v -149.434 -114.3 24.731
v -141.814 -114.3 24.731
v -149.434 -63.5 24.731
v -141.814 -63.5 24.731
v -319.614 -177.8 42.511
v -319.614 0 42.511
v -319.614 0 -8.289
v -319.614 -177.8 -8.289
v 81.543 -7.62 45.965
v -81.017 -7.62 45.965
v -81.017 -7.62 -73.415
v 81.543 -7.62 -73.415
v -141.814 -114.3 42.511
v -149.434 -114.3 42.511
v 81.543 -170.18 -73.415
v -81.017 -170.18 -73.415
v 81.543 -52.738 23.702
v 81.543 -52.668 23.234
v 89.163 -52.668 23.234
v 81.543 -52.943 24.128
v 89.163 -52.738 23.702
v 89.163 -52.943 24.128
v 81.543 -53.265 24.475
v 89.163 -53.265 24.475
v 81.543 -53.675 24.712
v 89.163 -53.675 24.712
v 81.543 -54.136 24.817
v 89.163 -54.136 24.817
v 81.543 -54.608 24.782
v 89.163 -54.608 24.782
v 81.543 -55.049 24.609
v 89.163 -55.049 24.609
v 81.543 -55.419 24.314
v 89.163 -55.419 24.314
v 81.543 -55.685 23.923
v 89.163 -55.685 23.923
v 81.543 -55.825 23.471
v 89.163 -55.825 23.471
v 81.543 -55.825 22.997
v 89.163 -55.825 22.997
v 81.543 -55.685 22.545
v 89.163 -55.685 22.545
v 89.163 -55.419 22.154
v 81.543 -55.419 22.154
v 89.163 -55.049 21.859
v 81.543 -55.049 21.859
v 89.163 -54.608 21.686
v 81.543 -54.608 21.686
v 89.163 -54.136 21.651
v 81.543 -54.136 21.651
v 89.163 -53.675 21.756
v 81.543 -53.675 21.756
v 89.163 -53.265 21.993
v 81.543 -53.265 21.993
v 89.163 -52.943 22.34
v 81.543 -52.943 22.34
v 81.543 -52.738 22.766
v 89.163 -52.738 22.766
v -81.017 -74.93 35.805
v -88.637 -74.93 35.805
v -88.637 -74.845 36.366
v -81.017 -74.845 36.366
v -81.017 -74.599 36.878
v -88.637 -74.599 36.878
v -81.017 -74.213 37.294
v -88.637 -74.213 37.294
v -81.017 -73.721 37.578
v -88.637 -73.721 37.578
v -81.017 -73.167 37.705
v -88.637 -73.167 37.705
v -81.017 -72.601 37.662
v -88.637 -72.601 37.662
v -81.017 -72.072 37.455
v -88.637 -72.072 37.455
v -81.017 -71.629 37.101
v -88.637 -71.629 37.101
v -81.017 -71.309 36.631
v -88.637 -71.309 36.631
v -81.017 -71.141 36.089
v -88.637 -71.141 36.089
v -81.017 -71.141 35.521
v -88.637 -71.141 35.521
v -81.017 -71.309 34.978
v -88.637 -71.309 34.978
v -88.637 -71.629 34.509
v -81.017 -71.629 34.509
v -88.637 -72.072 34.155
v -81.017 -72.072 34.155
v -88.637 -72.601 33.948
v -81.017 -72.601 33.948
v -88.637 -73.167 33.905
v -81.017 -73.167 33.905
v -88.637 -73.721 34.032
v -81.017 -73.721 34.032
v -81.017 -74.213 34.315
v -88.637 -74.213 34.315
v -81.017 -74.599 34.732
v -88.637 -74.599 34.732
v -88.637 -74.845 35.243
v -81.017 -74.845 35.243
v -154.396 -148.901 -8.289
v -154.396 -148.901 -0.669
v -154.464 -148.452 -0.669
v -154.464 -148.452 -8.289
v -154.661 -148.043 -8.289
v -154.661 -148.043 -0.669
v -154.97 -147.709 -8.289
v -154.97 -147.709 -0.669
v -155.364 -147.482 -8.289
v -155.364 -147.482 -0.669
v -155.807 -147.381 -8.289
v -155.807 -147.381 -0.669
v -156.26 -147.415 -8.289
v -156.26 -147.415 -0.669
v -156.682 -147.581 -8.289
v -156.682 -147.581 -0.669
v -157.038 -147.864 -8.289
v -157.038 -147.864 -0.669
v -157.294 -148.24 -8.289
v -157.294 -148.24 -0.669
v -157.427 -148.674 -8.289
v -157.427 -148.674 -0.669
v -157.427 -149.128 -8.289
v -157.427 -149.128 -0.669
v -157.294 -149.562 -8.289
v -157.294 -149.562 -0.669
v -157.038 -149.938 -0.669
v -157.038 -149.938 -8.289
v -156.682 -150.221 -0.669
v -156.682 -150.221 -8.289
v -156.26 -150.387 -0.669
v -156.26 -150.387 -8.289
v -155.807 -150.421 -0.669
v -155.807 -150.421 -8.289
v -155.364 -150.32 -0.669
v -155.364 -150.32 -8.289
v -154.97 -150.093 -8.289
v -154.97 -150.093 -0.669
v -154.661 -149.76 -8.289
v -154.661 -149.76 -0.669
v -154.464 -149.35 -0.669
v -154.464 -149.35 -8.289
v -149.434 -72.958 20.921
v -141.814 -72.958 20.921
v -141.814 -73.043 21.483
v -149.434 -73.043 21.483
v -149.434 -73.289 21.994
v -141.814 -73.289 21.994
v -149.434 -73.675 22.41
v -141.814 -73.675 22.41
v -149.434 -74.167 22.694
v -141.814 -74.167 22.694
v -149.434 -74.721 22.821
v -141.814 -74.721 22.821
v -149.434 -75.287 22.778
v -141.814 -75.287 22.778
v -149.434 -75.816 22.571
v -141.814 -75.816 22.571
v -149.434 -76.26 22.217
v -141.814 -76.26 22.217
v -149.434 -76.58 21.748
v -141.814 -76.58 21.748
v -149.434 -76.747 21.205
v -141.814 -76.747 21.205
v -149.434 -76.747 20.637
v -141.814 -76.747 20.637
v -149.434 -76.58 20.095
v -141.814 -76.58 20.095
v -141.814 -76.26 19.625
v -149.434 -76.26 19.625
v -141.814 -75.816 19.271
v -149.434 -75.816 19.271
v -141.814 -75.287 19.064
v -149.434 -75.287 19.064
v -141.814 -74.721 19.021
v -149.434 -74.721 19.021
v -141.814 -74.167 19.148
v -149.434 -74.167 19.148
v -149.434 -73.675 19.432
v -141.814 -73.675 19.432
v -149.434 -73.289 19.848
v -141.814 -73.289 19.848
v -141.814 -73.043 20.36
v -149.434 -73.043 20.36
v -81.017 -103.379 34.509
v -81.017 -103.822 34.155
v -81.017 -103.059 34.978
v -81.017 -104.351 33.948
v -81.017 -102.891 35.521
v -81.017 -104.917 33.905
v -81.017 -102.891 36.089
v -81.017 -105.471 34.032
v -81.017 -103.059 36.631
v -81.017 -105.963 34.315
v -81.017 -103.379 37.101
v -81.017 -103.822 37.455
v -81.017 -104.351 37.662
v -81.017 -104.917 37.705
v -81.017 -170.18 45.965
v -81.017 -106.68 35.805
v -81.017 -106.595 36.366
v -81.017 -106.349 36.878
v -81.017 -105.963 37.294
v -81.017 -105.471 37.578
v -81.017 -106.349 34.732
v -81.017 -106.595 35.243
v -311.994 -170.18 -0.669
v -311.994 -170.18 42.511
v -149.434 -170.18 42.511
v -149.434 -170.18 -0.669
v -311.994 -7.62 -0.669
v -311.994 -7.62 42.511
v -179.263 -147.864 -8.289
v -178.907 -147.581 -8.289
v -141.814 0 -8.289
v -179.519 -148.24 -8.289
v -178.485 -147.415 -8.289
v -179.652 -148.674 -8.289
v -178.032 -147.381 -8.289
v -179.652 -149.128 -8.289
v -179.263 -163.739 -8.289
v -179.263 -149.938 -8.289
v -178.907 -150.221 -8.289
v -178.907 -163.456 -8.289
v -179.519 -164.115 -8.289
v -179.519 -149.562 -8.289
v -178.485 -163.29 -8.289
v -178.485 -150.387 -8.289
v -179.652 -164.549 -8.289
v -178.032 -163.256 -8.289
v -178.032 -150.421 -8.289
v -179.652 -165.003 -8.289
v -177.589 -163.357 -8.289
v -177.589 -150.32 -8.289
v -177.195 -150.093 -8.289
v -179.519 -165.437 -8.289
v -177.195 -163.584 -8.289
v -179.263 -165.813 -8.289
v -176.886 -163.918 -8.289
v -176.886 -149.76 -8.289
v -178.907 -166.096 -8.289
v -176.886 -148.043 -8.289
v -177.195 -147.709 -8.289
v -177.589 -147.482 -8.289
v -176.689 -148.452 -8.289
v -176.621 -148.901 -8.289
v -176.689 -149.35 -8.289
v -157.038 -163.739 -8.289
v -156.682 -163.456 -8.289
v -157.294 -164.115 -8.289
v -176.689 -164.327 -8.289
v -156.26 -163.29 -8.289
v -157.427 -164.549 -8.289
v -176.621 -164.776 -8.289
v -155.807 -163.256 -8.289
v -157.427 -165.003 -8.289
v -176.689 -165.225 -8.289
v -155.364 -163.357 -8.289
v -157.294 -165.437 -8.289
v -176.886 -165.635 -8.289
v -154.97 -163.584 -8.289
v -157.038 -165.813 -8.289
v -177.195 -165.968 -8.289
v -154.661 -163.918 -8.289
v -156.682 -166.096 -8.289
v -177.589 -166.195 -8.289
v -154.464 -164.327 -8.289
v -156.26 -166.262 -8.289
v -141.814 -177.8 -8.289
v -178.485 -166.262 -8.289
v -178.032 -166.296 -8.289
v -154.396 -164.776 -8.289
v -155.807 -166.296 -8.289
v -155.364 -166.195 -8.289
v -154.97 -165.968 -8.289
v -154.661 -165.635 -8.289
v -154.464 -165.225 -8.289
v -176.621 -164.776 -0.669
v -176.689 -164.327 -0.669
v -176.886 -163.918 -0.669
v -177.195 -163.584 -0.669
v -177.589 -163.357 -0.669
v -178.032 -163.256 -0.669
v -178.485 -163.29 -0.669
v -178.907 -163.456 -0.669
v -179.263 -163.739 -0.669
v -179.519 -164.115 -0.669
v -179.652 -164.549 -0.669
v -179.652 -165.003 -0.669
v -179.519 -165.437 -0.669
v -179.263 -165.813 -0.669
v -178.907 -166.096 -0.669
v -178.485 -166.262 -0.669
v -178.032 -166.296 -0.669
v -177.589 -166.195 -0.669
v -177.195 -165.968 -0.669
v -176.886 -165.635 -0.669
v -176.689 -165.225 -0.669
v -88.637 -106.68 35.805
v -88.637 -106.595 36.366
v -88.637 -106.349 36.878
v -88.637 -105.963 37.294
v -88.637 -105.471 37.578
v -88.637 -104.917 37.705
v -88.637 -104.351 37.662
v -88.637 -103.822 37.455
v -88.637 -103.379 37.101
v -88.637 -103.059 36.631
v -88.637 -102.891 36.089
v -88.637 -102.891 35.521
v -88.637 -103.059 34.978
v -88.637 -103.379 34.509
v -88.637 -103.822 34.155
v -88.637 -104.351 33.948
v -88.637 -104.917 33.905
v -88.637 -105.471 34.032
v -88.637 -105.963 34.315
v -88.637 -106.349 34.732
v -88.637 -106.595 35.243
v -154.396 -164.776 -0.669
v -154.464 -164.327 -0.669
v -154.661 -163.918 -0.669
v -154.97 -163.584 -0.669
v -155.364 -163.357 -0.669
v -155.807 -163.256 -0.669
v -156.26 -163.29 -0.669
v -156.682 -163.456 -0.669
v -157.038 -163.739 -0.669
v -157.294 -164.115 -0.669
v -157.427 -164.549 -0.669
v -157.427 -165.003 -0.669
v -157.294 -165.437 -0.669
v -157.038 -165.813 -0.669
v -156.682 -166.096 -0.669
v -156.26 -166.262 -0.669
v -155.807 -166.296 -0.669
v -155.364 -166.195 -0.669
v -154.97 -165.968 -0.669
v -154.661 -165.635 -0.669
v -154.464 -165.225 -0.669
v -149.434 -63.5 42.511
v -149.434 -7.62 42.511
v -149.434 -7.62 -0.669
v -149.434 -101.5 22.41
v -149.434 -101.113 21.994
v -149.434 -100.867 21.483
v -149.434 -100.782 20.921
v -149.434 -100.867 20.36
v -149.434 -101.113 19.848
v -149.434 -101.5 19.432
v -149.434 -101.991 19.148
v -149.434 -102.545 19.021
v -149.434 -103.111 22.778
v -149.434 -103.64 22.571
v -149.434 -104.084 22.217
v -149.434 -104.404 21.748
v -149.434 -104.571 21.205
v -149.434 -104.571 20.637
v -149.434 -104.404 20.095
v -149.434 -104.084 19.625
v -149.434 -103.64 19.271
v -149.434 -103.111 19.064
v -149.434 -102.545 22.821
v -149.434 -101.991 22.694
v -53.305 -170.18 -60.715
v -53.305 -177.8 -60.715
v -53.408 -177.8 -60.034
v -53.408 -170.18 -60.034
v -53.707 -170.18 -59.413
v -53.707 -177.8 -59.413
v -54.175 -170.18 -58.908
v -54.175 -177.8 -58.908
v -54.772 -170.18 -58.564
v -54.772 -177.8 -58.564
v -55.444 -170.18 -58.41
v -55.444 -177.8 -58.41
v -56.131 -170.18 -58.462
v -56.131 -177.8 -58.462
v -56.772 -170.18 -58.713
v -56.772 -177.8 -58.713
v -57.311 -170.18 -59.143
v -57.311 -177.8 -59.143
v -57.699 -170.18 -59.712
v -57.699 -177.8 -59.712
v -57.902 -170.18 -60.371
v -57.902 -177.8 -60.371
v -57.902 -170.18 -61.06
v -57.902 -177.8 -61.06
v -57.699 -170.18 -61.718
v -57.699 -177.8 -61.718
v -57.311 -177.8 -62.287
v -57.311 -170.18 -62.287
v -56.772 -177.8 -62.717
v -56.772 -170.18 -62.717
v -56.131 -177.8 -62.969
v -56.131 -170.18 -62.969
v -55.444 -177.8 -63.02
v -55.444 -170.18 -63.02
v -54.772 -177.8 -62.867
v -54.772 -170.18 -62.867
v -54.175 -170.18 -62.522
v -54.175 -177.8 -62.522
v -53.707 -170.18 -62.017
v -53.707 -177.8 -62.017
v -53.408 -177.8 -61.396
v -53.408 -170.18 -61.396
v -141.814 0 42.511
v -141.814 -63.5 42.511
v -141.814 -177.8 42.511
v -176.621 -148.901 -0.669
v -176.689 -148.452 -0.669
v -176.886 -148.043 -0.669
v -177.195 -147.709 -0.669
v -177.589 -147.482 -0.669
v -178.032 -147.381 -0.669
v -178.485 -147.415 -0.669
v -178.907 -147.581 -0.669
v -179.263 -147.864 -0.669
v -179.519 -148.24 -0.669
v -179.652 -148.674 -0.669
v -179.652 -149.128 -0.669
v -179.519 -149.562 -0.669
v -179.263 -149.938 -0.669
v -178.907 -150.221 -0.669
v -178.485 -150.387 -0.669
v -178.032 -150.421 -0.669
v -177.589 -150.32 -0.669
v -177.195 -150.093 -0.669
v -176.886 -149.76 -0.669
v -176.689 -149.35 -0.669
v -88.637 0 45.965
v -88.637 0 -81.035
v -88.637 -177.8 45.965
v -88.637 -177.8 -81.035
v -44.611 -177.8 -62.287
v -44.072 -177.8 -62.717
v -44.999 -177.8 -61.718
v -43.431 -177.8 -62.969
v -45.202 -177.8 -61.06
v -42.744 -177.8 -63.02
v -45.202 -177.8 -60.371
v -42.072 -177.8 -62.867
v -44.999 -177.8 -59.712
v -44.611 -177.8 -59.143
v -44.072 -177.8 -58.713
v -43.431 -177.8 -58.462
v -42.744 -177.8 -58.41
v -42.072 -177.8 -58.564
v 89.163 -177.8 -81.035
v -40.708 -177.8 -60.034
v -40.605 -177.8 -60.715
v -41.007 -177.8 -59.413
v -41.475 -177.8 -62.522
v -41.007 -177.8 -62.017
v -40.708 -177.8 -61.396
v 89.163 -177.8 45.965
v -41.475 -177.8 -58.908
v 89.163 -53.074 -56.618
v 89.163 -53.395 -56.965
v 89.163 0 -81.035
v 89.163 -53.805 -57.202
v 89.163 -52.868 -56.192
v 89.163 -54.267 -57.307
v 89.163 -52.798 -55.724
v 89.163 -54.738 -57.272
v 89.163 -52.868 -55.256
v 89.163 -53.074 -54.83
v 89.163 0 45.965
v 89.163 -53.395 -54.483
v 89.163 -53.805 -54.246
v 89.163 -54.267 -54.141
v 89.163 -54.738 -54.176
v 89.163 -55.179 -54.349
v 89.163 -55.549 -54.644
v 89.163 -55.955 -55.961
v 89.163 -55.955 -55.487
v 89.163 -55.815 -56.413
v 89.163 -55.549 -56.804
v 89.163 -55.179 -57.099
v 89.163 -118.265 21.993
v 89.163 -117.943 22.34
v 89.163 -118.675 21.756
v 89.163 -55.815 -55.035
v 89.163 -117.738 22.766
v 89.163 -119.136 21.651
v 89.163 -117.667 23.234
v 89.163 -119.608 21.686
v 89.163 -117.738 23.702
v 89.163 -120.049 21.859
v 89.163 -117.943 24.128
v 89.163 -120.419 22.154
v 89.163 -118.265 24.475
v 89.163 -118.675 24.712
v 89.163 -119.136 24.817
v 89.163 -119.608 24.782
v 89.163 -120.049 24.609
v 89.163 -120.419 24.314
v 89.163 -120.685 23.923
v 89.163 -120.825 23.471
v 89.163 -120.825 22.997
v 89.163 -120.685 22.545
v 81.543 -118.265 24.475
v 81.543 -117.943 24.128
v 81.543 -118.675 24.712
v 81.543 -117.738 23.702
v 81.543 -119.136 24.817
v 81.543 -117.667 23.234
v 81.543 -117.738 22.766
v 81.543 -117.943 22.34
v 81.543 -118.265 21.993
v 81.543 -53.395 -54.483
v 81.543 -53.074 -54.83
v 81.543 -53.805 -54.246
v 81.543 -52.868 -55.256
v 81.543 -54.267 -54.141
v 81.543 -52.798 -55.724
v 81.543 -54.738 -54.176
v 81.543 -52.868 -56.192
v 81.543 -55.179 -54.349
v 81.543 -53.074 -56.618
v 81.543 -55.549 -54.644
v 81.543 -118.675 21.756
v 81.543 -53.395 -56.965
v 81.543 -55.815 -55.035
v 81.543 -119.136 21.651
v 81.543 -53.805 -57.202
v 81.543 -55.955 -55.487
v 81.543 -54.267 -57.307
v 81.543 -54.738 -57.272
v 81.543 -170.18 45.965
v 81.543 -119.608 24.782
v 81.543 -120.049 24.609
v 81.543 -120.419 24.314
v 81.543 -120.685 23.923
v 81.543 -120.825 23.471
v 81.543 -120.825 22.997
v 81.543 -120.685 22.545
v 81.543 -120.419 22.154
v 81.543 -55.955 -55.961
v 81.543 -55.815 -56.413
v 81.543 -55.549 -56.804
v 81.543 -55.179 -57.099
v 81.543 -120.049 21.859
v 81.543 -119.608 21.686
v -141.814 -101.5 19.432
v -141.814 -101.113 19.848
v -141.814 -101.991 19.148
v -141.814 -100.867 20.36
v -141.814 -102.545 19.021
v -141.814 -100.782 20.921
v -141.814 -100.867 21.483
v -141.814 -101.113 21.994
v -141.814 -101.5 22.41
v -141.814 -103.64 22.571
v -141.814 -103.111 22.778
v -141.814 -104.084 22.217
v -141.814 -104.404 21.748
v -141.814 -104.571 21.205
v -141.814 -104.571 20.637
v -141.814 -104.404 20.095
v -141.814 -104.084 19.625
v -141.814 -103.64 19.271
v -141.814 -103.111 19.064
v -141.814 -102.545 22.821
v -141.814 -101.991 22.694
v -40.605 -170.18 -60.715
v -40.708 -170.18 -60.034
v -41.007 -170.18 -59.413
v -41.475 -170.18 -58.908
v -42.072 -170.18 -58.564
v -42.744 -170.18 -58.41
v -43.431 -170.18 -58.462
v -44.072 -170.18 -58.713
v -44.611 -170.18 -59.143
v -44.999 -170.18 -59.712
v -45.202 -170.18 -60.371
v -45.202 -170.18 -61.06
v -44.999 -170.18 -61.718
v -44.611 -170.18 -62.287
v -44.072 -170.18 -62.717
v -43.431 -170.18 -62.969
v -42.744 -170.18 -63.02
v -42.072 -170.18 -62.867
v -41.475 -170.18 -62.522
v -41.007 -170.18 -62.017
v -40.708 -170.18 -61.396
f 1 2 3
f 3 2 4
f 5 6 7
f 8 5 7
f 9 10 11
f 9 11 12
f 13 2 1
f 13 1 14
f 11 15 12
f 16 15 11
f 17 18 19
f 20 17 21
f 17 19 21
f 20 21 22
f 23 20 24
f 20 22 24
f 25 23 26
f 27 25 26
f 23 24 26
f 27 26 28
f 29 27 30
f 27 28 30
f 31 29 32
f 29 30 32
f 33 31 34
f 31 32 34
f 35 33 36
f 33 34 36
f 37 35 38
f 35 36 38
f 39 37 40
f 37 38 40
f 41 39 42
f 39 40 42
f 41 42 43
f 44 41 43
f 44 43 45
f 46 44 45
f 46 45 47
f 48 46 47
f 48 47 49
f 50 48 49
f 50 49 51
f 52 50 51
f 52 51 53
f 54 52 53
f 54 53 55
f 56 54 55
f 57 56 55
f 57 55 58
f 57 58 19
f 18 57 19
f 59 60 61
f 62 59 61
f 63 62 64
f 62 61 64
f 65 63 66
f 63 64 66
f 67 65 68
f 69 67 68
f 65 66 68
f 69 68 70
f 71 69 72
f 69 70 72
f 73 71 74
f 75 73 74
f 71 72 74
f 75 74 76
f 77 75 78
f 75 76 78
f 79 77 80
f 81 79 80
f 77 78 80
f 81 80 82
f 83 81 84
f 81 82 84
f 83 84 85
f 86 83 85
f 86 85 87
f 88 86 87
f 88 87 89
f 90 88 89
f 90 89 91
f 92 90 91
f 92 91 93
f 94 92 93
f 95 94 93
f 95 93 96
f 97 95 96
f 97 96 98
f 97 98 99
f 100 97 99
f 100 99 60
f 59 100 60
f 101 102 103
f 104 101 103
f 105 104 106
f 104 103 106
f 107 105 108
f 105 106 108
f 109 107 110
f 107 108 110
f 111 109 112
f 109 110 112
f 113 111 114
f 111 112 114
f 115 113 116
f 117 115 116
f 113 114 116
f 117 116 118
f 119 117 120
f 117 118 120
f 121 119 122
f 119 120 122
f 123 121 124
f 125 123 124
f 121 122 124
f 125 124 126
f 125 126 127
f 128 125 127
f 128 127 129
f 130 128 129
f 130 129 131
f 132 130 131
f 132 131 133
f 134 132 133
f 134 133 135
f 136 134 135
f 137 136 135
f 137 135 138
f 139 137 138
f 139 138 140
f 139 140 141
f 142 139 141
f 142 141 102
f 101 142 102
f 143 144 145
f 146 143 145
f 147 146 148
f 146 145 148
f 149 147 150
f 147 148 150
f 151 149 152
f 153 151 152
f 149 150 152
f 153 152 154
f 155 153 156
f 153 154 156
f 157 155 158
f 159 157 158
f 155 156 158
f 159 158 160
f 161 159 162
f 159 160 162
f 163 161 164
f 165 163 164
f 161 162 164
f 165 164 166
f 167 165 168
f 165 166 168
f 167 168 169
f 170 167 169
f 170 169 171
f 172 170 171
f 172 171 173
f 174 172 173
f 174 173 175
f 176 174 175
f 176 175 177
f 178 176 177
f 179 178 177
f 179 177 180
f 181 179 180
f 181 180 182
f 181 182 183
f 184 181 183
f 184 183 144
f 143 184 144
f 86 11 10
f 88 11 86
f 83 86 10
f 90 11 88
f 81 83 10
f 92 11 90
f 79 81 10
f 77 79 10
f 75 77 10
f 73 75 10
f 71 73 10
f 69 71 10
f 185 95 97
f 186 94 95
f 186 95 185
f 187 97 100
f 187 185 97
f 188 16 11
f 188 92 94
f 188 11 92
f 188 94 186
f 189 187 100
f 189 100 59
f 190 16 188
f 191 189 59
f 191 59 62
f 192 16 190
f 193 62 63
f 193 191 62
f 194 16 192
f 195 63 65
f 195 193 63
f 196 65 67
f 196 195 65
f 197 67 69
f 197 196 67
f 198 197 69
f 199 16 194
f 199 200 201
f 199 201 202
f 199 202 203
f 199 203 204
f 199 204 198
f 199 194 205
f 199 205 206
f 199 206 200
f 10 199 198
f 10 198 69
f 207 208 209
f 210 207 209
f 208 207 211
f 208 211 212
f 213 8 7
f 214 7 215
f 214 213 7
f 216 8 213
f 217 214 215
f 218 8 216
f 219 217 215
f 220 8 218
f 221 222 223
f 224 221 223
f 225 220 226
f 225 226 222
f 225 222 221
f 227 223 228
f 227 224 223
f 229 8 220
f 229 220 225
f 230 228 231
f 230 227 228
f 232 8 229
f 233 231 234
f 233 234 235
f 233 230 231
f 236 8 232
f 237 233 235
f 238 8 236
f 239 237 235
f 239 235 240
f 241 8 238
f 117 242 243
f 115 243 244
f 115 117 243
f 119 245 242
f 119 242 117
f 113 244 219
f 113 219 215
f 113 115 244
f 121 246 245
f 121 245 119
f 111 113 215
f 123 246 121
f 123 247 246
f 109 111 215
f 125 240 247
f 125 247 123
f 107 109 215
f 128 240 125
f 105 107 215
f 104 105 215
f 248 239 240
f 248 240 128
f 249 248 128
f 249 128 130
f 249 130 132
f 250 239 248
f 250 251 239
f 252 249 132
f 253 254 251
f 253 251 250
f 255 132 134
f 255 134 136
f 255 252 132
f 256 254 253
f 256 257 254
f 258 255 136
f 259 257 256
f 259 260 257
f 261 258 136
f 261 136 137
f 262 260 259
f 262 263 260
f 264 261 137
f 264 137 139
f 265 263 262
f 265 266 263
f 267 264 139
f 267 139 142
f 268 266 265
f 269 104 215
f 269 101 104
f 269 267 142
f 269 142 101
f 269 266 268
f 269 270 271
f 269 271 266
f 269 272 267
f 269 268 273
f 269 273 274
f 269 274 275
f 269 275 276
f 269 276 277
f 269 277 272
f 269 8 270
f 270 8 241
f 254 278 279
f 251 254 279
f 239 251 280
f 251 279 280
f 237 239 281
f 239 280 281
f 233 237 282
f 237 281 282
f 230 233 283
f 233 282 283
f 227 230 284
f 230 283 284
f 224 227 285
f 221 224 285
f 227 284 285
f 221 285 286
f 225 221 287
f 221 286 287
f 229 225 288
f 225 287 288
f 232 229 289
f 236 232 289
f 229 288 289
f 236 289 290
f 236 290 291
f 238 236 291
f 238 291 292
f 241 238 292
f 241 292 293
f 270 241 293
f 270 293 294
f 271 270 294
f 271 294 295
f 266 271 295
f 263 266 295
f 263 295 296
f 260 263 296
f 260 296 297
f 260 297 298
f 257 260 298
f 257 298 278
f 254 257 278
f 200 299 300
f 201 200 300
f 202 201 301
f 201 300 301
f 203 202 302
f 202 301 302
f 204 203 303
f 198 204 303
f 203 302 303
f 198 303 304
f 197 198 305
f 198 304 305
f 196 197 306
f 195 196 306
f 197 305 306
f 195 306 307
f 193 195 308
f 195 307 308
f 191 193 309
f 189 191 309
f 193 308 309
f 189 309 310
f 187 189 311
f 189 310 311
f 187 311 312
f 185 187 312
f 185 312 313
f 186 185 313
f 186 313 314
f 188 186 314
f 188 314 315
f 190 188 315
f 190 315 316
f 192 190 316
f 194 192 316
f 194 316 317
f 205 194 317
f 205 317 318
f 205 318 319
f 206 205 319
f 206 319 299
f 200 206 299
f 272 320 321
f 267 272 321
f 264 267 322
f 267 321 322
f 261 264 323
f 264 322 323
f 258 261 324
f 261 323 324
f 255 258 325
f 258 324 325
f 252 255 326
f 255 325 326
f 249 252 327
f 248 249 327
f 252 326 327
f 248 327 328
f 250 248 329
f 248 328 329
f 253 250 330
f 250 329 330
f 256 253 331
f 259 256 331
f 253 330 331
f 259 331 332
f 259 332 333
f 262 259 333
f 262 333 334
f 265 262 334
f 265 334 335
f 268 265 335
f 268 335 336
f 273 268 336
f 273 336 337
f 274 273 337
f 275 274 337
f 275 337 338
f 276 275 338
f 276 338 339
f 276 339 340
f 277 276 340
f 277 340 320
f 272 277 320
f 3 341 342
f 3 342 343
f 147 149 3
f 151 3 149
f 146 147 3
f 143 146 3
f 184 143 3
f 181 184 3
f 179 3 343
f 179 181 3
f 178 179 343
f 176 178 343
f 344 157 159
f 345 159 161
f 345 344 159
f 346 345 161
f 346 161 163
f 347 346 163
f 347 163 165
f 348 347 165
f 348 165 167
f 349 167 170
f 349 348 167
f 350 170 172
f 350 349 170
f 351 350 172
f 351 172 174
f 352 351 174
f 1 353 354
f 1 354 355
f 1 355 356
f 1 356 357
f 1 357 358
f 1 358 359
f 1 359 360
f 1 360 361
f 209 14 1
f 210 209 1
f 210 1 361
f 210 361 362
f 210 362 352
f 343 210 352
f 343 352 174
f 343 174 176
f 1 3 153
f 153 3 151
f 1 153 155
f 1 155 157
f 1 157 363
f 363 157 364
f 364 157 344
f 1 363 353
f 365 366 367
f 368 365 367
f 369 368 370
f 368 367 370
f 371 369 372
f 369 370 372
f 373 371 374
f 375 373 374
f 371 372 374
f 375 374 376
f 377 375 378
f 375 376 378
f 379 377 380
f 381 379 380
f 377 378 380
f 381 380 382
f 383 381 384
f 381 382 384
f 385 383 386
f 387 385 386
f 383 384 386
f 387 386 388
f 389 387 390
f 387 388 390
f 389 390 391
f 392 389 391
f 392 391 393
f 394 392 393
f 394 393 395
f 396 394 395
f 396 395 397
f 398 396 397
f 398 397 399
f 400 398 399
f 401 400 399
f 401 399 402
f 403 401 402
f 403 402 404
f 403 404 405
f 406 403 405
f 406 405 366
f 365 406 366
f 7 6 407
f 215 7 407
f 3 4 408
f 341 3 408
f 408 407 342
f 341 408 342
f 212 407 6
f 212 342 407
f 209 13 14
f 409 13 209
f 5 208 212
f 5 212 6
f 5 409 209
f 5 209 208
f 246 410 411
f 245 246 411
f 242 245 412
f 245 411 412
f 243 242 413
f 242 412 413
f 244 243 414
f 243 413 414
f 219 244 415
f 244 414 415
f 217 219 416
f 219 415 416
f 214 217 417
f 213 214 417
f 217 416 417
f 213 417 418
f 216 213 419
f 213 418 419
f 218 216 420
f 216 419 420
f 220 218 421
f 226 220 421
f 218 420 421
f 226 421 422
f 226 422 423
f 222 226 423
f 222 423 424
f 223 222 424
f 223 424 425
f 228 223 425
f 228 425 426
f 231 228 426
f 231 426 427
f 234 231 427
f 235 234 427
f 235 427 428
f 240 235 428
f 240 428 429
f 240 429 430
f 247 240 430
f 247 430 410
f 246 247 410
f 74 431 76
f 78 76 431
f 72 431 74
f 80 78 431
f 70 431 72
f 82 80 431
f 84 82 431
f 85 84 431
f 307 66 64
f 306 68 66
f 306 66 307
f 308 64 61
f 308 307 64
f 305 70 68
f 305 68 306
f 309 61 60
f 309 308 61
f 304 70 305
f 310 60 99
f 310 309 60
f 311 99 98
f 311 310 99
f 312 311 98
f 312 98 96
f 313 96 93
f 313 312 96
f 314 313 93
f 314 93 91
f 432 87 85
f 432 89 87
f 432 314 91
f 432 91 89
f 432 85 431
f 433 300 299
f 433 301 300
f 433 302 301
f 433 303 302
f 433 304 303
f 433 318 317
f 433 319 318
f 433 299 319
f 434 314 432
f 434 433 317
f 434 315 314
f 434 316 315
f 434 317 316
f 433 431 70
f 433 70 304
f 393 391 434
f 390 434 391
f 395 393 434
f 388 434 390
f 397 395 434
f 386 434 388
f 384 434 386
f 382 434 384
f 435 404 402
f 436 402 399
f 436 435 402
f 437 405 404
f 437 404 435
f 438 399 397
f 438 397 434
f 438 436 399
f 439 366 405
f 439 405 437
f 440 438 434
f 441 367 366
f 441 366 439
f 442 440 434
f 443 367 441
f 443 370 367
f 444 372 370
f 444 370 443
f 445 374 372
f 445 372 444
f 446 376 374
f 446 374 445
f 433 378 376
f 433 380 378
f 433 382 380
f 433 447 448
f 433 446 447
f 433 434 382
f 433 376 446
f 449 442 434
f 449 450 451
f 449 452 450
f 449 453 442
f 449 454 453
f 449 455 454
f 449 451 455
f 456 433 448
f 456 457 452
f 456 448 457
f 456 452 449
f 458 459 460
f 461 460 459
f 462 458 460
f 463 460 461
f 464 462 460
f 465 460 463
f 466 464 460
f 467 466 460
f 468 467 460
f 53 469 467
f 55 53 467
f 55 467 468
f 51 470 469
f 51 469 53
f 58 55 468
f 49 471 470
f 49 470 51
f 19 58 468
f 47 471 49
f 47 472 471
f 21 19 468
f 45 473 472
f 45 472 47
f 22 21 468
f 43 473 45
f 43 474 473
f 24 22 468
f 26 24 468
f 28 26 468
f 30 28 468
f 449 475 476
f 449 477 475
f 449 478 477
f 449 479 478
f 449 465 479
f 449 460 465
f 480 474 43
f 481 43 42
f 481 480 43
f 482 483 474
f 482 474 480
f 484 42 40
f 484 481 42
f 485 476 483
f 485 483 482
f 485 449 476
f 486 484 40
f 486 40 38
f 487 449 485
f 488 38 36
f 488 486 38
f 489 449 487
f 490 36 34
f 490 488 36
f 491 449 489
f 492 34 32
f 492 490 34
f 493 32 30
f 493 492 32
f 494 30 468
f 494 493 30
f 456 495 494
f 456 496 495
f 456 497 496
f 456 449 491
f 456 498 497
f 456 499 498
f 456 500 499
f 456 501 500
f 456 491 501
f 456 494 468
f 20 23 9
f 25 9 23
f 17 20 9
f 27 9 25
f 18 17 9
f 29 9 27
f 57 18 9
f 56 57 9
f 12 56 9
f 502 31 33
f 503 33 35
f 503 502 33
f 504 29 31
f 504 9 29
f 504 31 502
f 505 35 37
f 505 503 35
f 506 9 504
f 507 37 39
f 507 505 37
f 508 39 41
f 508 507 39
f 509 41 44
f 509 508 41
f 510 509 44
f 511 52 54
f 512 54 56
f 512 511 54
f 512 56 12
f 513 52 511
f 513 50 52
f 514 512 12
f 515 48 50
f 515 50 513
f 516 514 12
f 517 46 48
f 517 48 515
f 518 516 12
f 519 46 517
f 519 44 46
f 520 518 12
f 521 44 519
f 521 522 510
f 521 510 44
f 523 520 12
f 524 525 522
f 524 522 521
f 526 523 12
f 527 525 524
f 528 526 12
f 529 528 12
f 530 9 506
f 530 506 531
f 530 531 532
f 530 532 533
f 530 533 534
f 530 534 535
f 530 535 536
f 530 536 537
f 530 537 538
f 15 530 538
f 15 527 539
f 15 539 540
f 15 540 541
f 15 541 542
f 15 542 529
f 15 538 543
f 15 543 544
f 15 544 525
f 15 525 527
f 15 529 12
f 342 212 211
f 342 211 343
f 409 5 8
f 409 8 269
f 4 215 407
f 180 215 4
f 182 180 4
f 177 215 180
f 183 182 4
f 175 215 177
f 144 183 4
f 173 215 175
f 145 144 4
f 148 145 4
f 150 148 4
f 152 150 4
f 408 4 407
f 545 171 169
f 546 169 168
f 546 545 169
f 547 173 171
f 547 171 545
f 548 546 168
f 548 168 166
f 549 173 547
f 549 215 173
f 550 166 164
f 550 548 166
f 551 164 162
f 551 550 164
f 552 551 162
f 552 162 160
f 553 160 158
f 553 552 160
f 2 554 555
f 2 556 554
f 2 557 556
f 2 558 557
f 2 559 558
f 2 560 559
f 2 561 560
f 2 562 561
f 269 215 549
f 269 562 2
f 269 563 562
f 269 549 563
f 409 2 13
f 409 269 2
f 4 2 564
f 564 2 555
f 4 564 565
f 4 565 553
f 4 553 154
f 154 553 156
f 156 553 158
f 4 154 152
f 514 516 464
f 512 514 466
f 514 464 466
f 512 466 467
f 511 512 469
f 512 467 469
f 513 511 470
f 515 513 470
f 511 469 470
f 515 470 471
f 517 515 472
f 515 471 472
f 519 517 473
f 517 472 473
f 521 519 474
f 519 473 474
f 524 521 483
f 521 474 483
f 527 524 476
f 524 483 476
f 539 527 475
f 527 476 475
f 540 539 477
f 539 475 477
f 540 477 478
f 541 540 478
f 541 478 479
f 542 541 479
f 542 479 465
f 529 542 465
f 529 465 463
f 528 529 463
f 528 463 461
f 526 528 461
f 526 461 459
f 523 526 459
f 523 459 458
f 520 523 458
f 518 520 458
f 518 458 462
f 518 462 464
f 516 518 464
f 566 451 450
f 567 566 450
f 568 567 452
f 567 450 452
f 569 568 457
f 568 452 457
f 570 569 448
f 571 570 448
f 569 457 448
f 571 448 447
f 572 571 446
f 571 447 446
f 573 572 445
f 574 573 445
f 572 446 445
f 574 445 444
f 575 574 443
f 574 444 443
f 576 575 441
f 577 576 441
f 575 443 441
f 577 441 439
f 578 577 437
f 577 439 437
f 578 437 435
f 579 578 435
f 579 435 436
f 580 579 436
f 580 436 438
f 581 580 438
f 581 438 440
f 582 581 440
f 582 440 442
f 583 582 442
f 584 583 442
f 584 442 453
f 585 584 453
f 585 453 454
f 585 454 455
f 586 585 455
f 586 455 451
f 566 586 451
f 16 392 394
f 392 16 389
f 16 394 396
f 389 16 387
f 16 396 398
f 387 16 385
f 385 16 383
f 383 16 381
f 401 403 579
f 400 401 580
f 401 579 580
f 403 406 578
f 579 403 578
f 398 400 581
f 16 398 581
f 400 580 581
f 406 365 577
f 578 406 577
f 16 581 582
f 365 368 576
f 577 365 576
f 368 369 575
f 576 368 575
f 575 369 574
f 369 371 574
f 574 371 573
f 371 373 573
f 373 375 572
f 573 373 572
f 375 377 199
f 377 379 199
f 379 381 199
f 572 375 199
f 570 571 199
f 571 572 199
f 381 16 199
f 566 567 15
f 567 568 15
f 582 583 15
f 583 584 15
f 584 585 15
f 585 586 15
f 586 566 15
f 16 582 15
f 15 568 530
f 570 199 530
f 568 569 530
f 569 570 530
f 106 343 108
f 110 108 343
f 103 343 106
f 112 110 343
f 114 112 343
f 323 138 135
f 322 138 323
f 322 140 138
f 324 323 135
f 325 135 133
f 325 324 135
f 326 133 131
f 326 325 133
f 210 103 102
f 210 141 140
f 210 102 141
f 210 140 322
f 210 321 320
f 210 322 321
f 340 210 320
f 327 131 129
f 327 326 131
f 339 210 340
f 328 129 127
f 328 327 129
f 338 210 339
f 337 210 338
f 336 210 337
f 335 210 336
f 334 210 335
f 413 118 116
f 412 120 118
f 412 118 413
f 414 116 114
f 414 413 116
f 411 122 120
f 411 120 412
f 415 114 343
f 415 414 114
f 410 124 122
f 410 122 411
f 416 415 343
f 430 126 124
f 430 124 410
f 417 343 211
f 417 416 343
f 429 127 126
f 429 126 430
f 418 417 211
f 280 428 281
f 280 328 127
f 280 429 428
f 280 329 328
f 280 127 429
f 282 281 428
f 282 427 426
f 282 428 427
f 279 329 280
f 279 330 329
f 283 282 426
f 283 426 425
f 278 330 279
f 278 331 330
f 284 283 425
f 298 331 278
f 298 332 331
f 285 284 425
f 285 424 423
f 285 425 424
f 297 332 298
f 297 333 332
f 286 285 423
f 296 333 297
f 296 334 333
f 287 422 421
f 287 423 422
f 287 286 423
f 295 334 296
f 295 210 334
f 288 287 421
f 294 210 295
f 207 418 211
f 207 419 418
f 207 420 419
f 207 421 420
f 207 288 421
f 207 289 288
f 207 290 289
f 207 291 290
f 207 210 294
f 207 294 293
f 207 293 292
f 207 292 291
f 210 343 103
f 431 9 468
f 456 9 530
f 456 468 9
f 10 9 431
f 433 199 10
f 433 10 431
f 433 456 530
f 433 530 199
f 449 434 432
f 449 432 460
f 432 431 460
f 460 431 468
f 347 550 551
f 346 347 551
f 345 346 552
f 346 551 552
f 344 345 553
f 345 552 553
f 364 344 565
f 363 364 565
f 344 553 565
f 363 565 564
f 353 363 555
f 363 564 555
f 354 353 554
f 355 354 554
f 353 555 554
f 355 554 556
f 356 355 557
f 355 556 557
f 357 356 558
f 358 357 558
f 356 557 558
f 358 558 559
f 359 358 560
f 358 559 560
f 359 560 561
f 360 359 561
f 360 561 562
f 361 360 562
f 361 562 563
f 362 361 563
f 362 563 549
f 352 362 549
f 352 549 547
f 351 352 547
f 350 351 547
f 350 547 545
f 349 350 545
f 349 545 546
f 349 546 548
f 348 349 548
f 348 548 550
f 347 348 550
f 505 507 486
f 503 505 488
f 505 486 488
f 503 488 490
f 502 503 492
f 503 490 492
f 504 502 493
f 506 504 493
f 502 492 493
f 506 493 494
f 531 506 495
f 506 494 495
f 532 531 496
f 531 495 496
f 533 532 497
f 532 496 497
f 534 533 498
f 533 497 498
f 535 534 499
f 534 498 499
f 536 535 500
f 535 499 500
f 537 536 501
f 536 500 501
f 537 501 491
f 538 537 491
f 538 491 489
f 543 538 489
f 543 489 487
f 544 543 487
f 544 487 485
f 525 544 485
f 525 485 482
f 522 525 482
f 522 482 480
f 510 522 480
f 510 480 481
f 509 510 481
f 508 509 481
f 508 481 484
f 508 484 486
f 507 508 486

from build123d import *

# Parameters (mm, degrees)
F0_W      = 162.56
F0_H      = 119.38
F1_DEPTH  = 7.62
F2_DEPTH  = 88.9
F4_W      = 162.56
F4_H      = 43.18
F5_DEPTH  = 7.62
F6_DEPTH  = 88.9
F8_R      = 2.3114
F9_DEPTH  = 25.4
F10_R     = 1.905
F11_DEPTH = 25.4
F12_W     = 50.8
F12_H     = 17.78
F13_DEPTH = 25.4
F12_R     = 1.905
F14_DEPTH = 25.4
F15_R     = 1.5875
F16_DEPTH = 25.4
F17_R     = 1.524
F18_DEPTH = 25.4


with BuildPart() as f1:
    # F0 (on Front) → F1 (new body)
    with BuildSketch(Plane.XZ):
        with Locations((0.263474, -13.725161)):
            Rectangle(F0_W, F0_H)
    extrude(amount=F1_DEPTH)

    # F0 (on Front) → F2 (join)
    with BuildSketch(Plane.XZ):
        Polygon((-81.016526, 45.964839), (-88.636526, 45.964839), (-88.636526, -81.035161), (89.163474, -81.035161), (89.163474, 45.964839), (81.543474, 45.964839), (81.543474, -73.415161), (-81.016526, -73.415161), align=None)
    extrude(amount=F2_DEPTH)

    # F3: F1 across face


with BuildPart() as f1_1:
    add(f1.part)
    add(f1.part.mirror(Plane(origin=(0.263474, -88.9, -40.828819), x_dir=(1, 0, 0), z_dir=(0, -1, 0))))

    # F8 (on face) → F9 (cut)
    with BuildSketch(Plane.XZ.offset(177.8)):
        with Locations((-55.616526, -60.715161)):
            Circle(F8_R)
        with Locations((-42.916526, -60.715161)):
            Circle(F8_R)
    extrude(amount=-F9_DEPTH, mode=Mode.SUBTRACT)

    # F10 (on face) → F11 (cut)
    with BuildSketch(Plane(origin=(-88.636526, 0, 0), x_dir=(0, -1, 0), z_dir=(-1, 0, 0))):
        with Locations((73.025, 35.804839)):
            Circle(F10_R)
        with Locations((104.775, 35.804839)):
            Circle(F10_R)
    extrude(amount=-F11_DEPTH, mode=Mode.SUBTRACT)

    # F15 (on face) → F16 (cut)
    with BuildSketch(Plane.YZ.offset(89.163474)):
        with Locations((-119.255, 23.234042)):
            Circle(F15_R)
        with Locations((-54.255, 23.234042)):
            Circle(F15_R)
        with Locations((-54.385198, -55.723958)):
            Circle(F15_R)
    extrude(amount=-F16_DEPTH, mode=Mode.SUBTRACT)


with BuildPart() as f5:
    # F4 (on Front) → F5 (new body)
    with BuildSketch(Plane.XZ):
        with Locations((-230.714412, 20.921105)):
            Rectangle(F4_W, F4_H)
    extrude(amount=F5_DEPTH)

    # F4 (on Front) → F6 (join)
    with BuildSketch(Plane.XZ):
        Polygon((-311.994412, 42.511105), (-319.614412, 42.511105), (-319.614412, -8.288895), (-141.814412, -8.288895), (-141.814412, 42.511105), (-149.434412, 42.511105), (-149.434412, -0.668895), (-311.994412, -0.668895), align=None)
    extrude(amount=F6_DEPTH)

    # F7: F5 across face


with BuildPart() as f5_1:
    add(f5.part)
    add(f5.part.mirror(Plane(origin=(-230.714412, -88.9, 3.824951), x_dir=(1, 0, 0), z_dir=(0, -1, 0))))

    # F12 (on face) → F13 (cut)
    with BuildSketch(Plane.YZ.offset(-141.814412)):
        with Locations((-88.9, 33.621105)):
            Rectangle(F12_W, F12_H)
    extrude(amount=-F13_DEPTH, mode=Mode.SUBTRACT)

    # F12 (on face) → F14 (cut)
    with BuildSketch(Plane.YZ.offset(-141.814412)):
        with Locations((-102.687311, 20.921105)):
            Circle(F12_R)
        with Locations((-74.863158, 20.921105)):
            Circle(F12_R)
    extrude(amount=-F14_DEPTH, mode=Mode.SUBTRACT)

    # F17 (on face) → F18 (cut)
    with BuildSketch(Plane.XY.offset(-0.668895)):
        with Locations((-178.145485, -148.901001)):
            Circle(F17_R)
        with Locations((-155.920485, -148.901001)):
            Circle(F17_R)
        with Locations((-178.145485, -164.776001)):
            Circle(F17_R)
        with Locations((-155.920485, -164.776001)):
            Circle(F17_R)
    extrude(amount=-F18_DEPTH, mode=Mode.SUBTRACT)


solid = Compound([f1_1.part, f5_1.part])
